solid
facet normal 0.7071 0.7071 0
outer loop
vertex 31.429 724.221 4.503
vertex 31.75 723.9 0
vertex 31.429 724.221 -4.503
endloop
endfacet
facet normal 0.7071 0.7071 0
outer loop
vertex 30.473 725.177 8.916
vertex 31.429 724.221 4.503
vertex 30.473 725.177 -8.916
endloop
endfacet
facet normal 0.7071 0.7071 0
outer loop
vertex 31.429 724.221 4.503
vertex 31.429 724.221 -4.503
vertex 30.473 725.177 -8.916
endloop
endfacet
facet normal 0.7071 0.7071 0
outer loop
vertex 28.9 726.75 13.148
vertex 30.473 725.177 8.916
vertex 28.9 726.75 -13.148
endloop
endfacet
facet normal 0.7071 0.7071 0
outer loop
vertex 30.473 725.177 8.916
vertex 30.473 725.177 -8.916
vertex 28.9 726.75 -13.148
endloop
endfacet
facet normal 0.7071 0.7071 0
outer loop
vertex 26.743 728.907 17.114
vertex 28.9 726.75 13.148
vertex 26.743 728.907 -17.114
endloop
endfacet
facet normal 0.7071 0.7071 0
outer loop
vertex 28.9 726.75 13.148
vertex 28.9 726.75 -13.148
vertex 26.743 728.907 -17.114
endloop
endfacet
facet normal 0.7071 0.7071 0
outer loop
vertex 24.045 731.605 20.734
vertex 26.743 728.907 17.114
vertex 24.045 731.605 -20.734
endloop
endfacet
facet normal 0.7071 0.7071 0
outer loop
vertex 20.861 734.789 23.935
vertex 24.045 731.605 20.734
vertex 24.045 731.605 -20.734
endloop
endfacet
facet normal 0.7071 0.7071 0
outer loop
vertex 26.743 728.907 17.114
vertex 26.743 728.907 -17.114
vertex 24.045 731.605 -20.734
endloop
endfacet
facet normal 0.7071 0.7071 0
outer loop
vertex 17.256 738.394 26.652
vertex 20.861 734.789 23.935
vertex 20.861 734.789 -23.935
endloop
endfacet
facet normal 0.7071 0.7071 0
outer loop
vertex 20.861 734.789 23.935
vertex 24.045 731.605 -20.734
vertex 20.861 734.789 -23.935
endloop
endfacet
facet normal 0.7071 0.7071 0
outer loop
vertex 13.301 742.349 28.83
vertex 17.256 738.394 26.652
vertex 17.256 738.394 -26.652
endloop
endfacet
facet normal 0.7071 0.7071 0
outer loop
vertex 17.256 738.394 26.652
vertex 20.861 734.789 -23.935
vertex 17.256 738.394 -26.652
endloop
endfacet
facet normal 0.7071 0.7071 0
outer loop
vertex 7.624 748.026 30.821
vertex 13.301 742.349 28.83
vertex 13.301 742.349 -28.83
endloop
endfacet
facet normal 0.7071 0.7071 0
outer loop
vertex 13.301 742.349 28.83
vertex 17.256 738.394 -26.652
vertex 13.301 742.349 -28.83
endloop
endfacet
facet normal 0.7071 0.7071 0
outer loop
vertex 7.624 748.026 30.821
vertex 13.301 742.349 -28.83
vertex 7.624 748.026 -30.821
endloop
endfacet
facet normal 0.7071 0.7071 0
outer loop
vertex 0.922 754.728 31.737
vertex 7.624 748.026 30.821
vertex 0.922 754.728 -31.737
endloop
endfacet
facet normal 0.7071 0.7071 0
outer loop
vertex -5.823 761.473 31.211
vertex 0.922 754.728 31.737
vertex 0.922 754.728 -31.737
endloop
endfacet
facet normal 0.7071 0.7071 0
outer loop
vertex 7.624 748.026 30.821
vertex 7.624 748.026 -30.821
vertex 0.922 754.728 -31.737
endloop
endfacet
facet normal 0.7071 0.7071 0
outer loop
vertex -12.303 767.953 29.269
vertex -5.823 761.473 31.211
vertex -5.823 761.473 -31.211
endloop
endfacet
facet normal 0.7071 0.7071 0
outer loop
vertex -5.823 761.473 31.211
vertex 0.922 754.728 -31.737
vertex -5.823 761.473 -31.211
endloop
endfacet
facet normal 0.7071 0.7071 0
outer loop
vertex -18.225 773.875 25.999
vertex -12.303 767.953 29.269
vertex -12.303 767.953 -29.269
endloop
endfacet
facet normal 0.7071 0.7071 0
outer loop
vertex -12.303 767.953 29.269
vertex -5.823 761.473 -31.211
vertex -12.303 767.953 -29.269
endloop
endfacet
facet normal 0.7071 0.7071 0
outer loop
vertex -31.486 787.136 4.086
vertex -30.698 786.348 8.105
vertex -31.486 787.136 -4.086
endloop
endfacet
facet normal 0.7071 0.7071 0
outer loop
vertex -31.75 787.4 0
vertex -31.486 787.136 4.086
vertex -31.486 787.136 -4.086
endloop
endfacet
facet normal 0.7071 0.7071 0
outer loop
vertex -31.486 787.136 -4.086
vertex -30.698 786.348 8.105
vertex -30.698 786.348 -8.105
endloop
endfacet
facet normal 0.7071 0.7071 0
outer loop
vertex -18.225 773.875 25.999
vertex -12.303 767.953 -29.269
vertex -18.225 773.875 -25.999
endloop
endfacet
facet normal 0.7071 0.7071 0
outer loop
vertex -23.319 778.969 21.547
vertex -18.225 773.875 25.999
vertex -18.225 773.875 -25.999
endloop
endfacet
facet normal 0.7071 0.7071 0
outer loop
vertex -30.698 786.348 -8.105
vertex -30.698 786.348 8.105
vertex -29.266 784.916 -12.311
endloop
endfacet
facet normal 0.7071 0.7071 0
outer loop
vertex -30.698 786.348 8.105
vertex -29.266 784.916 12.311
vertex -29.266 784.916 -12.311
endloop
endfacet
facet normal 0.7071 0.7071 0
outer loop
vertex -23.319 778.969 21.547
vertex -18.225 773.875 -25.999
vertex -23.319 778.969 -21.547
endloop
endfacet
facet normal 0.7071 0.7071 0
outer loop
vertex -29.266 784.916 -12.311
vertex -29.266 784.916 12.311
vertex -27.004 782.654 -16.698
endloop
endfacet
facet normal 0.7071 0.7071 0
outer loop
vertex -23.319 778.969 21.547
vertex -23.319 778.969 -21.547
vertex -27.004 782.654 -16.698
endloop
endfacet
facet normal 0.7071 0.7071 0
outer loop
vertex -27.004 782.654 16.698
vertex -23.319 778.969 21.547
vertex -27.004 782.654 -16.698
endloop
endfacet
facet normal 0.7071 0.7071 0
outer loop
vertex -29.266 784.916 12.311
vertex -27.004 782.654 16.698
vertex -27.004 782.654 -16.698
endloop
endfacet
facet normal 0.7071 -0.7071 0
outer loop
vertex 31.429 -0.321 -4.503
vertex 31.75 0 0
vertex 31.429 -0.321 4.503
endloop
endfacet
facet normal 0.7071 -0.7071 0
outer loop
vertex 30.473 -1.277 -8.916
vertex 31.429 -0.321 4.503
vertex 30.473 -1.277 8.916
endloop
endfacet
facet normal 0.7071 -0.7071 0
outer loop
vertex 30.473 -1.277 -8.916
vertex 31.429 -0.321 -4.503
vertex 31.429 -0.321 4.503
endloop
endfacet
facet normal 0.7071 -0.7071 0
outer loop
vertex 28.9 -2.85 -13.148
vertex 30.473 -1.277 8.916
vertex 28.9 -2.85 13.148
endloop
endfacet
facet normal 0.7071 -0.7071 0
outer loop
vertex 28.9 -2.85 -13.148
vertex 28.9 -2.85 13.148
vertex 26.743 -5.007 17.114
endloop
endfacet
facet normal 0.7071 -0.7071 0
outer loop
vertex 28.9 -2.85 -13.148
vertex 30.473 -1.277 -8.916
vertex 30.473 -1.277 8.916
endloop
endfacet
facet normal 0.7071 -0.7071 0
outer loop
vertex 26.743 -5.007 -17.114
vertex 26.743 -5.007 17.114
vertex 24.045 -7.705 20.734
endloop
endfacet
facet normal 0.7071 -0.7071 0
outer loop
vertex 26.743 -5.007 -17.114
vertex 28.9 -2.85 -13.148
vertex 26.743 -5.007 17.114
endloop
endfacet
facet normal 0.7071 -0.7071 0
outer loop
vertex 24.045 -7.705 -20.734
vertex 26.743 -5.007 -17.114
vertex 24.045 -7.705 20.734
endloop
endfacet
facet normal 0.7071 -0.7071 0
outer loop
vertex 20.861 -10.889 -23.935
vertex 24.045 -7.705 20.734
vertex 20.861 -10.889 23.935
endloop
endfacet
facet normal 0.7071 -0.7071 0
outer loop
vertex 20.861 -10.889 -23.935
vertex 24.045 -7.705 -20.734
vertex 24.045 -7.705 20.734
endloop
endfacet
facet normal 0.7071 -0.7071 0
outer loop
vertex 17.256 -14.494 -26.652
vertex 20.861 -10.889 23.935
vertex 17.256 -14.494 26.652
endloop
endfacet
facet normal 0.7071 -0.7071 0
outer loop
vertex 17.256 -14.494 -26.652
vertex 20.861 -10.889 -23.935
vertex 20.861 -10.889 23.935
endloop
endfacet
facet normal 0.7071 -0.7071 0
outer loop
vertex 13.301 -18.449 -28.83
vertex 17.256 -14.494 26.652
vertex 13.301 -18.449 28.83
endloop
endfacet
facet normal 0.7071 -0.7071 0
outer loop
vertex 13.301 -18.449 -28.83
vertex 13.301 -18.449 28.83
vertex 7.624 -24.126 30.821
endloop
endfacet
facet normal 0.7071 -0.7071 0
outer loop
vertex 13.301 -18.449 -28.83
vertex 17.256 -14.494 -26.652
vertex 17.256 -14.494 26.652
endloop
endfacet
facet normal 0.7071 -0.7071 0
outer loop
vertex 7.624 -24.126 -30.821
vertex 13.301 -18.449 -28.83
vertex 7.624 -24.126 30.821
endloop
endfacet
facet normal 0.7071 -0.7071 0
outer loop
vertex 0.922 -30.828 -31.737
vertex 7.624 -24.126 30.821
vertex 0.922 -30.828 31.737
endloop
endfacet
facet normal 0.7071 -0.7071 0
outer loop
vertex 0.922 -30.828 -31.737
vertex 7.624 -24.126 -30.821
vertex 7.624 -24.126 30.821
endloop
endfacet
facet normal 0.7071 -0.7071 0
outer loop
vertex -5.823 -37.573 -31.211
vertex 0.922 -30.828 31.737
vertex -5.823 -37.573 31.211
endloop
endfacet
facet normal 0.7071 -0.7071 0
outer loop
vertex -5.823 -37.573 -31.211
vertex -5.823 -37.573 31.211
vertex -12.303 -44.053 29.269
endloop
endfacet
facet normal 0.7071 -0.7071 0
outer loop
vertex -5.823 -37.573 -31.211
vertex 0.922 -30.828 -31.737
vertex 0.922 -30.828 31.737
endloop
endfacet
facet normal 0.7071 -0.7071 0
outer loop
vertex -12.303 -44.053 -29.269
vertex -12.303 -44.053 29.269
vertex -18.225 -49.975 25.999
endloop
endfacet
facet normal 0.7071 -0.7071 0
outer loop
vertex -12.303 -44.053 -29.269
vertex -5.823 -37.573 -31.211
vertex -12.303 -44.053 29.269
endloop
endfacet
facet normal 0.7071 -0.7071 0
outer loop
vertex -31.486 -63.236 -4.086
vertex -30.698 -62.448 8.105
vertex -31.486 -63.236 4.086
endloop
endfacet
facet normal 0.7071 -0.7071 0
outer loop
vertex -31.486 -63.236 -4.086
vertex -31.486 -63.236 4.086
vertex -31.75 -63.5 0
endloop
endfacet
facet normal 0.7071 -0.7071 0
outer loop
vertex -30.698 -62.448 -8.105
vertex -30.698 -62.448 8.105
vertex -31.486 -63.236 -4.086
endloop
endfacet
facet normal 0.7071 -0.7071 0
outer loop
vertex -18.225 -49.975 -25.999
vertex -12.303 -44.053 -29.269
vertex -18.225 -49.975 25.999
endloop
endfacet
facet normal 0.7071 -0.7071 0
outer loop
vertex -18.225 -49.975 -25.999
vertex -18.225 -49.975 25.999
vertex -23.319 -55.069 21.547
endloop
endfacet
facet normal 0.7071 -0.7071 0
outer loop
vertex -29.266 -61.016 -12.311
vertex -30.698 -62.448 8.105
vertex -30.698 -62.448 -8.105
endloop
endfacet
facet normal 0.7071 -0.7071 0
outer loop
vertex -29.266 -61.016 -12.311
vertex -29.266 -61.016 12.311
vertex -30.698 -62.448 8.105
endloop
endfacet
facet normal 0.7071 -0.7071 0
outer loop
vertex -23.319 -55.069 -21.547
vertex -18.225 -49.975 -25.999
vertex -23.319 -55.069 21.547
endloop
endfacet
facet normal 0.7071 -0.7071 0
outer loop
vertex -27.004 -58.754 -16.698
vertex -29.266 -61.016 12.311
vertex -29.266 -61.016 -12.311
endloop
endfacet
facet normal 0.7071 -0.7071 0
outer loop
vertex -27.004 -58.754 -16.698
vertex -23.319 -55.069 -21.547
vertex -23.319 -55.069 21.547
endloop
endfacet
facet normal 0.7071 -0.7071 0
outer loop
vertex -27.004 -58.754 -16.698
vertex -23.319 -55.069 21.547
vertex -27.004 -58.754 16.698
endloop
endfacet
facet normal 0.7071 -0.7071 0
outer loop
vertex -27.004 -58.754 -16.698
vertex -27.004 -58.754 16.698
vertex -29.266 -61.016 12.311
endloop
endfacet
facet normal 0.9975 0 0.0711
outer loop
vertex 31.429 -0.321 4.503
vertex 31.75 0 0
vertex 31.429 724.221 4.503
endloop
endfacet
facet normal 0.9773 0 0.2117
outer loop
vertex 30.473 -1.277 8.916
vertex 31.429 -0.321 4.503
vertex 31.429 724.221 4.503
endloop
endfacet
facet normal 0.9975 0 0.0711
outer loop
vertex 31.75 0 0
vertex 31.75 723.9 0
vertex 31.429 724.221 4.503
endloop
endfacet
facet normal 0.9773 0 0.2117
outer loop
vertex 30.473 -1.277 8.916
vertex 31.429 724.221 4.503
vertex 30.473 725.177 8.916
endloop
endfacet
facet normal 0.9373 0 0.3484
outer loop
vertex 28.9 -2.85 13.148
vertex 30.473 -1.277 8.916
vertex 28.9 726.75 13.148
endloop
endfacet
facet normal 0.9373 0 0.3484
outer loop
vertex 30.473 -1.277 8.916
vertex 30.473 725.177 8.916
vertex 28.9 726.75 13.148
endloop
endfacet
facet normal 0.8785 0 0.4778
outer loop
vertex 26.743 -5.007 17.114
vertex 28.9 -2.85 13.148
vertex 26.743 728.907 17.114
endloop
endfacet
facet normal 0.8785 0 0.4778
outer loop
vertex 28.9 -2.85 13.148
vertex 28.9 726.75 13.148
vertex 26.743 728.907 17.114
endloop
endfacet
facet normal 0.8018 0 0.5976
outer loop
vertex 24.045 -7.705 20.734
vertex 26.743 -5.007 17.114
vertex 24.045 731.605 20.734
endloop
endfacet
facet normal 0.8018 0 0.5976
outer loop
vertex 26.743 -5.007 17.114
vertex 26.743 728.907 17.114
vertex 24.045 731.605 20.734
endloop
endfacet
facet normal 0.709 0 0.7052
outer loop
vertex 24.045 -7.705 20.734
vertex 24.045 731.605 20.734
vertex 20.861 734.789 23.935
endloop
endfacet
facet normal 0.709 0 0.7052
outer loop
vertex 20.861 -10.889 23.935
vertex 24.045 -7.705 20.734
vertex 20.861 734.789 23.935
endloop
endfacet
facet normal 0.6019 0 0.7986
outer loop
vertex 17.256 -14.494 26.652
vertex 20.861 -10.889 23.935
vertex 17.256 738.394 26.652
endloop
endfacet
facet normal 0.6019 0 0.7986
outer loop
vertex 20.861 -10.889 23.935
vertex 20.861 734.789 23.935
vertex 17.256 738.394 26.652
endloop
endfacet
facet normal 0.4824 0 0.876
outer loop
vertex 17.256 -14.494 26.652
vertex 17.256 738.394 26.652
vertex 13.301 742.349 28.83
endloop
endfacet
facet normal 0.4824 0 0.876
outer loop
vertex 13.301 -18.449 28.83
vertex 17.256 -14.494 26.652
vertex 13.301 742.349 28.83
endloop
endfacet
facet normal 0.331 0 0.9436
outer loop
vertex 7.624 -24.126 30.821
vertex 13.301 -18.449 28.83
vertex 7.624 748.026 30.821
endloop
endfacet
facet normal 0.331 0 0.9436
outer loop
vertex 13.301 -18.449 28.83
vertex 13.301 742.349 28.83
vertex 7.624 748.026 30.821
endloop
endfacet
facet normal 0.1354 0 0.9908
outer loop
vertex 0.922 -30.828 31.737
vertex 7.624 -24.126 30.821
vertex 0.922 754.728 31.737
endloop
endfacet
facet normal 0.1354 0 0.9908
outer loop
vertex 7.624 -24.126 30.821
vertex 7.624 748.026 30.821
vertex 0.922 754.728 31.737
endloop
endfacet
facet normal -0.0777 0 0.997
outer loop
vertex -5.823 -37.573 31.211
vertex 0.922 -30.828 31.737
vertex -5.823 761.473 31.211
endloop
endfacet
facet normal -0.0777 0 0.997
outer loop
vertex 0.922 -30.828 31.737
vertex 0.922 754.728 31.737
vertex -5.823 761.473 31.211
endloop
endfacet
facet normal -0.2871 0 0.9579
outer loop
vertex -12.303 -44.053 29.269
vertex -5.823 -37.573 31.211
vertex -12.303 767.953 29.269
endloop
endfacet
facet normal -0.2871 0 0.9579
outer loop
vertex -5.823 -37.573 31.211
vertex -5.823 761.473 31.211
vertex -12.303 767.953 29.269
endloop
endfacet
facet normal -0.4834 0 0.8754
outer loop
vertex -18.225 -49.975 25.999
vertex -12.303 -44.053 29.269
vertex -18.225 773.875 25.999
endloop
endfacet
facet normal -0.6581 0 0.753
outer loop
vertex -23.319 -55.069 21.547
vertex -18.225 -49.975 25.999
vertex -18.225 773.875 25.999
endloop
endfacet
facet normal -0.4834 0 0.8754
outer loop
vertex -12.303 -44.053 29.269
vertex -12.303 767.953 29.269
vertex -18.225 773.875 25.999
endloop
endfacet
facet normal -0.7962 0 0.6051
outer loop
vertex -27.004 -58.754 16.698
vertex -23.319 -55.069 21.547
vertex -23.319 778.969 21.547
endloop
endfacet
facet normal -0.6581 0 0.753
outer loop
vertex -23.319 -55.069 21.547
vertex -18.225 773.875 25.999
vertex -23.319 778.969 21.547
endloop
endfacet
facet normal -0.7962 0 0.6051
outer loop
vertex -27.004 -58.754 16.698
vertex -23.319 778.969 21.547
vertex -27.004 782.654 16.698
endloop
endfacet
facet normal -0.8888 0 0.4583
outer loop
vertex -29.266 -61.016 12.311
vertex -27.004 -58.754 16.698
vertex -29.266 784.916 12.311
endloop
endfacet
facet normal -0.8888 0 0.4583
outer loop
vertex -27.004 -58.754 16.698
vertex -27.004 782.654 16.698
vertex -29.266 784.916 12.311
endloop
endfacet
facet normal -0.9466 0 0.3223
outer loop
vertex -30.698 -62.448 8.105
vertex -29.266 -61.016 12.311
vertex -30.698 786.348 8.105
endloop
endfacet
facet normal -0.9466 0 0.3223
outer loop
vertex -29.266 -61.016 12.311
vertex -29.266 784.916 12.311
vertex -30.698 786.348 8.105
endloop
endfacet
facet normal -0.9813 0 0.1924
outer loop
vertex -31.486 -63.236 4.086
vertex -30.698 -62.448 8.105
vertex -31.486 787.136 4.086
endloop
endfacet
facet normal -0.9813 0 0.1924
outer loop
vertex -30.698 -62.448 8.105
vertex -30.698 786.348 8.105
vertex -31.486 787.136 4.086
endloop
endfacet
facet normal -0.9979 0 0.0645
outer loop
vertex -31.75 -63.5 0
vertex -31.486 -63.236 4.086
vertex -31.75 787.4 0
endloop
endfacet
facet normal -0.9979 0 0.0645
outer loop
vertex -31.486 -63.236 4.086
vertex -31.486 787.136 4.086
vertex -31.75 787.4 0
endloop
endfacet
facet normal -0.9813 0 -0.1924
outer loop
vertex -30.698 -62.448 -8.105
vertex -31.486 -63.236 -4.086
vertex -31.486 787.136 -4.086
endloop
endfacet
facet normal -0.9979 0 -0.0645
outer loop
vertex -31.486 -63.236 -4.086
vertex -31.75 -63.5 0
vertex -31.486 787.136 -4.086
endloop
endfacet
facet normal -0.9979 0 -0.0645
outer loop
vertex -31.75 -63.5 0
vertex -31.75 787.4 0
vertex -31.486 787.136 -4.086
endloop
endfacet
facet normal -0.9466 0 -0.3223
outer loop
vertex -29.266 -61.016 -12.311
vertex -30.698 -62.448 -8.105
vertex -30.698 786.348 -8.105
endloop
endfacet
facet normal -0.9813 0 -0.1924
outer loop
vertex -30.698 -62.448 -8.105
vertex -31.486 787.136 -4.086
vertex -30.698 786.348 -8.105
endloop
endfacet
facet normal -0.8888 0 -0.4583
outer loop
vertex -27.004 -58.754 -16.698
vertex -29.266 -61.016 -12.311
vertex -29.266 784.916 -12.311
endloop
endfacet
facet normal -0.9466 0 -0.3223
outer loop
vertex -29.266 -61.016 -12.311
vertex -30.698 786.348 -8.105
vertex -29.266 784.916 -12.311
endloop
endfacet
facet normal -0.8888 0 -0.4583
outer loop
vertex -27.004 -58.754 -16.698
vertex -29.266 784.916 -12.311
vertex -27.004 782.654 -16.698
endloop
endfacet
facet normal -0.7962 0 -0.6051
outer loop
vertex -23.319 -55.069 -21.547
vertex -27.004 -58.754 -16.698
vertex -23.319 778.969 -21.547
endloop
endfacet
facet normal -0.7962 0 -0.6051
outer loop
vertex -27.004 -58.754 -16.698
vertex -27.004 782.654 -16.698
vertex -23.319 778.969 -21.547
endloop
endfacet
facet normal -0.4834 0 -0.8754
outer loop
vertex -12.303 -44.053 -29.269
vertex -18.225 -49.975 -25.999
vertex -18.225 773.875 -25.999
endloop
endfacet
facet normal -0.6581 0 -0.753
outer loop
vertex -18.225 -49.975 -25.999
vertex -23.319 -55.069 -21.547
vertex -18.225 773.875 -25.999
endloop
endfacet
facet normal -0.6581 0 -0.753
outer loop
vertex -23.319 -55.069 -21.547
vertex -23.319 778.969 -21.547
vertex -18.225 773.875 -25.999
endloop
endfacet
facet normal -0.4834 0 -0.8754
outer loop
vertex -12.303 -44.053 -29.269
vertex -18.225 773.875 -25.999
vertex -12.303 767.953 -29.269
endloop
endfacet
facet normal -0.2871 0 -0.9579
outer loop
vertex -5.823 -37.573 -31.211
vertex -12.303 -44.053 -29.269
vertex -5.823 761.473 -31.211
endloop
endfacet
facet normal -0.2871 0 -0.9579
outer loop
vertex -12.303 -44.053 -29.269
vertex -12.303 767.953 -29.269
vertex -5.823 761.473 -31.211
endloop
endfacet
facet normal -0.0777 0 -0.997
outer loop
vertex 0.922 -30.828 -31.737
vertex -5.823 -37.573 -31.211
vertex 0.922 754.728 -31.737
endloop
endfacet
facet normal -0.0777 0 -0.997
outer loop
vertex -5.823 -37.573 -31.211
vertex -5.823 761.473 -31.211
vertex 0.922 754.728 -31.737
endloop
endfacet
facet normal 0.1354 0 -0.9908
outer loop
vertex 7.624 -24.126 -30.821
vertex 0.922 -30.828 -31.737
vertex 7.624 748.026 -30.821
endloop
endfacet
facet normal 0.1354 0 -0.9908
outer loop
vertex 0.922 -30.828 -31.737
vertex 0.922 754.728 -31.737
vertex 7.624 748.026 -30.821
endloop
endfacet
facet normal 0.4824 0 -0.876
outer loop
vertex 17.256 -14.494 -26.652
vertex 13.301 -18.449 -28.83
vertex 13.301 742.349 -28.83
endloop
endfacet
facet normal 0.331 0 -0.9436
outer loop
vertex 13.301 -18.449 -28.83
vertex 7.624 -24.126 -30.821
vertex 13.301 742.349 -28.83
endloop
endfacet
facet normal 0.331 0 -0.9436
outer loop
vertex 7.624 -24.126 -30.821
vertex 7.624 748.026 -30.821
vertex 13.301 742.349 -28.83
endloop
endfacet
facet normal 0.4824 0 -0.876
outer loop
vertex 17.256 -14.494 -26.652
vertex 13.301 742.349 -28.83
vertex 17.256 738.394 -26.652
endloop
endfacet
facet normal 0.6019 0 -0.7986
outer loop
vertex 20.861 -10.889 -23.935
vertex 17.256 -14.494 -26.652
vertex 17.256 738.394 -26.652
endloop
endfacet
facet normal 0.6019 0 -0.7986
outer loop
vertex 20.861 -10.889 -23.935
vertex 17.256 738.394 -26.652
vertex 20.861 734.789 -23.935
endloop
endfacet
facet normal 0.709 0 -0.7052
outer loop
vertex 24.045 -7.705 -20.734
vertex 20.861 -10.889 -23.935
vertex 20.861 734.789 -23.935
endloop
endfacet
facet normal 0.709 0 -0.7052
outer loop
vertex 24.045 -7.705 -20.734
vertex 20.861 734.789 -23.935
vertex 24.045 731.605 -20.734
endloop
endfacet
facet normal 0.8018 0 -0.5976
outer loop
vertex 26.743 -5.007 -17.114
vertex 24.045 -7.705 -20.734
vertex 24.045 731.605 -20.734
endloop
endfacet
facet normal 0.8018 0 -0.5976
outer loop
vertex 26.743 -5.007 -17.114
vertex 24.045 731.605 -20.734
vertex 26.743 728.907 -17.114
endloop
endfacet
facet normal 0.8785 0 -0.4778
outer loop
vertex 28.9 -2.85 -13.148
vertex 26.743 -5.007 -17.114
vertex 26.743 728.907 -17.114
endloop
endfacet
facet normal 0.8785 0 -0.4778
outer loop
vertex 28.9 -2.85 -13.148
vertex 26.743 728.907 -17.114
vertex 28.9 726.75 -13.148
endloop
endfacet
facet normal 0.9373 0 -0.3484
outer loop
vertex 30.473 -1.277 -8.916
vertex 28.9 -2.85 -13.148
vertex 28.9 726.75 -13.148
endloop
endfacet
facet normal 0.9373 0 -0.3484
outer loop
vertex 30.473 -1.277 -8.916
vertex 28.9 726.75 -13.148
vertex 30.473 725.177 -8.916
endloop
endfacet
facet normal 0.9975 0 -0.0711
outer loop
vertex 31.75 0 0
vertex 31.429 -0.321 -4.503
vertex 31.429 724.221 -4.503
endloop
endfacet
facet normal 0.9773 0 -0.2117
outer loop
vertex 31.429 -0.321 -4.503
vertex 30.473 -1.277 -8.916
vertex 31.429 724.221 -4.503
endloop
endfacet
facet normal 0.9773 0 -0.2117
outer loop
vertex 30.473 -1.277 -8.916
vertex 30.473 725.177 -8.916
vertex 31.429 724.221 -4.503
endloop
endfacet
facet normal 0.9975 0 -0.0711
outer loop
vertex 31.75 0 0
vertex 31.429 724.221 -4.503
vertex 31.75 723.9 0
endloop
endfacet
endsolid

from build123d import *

# Parameters (mm, degrees)
SKETCH1_R               = 31.75
BOSS_EXTRUDE1_DEPTH     = 723.9
SKETCH4_R               = 31.75
BOSS_EXTRUDE2_DEPTH     = 63.5
BOSS_EXTRUDE3_START     = 63.5
SKETCH5_R               = 31.75
BOSS_EXTRUDE3_DEPTH     = 63.5
CUT_EXTRUDE2_DEPTH      = 63.5
CUT_EXTRUDE2_DEPTH_BACK = 63.5


with BuildPart() as part:
    # Sketch1 → Boss-Extrude1 (new body)
    with BuildSketch(Plane(origin=(0, 0, 0), x_dir=(1, 0, 0), z_dir=(0, 1, 0))):
        Circle(SKETCH1_R)
    extrude(amount=BOSS_EXTRUDE1_DEPTH)

    # Sketch4 → Boss-Extrude2 (add)
    with BuildSketch(Plane(origin=(0, 723.9, 0), x_dir=(1, 0, 0), z_dir=(0, 1, 0))):
        Circle(SKETCH4_R)
    extrude(amount=BOSS_EXTRUDE2_DEPTH)

    # Sketch5 → Boss-Extrude3 (add)
    with BuildSketch(Plane.XZ.offset(BOSS_EXTRUDE3_START)):
        Circle(SKETCH5_R)
    extrude(amount=-BOSS_EXTRUDE3_DEPTH)

    # Sketch2 → Cut-Extrude2 (cut, two sides: drawn at the far end of the back side and taken through both)
    with BuildSketch(Plane.XY.offset(-CUT_EXTRUDE2_DEPTH_BACK)):
        Polygon((-31.75, 787.4), (31.75, 723.9), (31.75, 787.4), align=None)
        Polygon((31.75, -63.5), (31.75, 0), (-31.75, -63.5), align=None)
    extrude(amount=CUT_EXTRUDE2_DEPTH + CUT_EXTRUDE2_DEPTH_BACK, mode=Mode.SUBTRACT)


solid = part.part
